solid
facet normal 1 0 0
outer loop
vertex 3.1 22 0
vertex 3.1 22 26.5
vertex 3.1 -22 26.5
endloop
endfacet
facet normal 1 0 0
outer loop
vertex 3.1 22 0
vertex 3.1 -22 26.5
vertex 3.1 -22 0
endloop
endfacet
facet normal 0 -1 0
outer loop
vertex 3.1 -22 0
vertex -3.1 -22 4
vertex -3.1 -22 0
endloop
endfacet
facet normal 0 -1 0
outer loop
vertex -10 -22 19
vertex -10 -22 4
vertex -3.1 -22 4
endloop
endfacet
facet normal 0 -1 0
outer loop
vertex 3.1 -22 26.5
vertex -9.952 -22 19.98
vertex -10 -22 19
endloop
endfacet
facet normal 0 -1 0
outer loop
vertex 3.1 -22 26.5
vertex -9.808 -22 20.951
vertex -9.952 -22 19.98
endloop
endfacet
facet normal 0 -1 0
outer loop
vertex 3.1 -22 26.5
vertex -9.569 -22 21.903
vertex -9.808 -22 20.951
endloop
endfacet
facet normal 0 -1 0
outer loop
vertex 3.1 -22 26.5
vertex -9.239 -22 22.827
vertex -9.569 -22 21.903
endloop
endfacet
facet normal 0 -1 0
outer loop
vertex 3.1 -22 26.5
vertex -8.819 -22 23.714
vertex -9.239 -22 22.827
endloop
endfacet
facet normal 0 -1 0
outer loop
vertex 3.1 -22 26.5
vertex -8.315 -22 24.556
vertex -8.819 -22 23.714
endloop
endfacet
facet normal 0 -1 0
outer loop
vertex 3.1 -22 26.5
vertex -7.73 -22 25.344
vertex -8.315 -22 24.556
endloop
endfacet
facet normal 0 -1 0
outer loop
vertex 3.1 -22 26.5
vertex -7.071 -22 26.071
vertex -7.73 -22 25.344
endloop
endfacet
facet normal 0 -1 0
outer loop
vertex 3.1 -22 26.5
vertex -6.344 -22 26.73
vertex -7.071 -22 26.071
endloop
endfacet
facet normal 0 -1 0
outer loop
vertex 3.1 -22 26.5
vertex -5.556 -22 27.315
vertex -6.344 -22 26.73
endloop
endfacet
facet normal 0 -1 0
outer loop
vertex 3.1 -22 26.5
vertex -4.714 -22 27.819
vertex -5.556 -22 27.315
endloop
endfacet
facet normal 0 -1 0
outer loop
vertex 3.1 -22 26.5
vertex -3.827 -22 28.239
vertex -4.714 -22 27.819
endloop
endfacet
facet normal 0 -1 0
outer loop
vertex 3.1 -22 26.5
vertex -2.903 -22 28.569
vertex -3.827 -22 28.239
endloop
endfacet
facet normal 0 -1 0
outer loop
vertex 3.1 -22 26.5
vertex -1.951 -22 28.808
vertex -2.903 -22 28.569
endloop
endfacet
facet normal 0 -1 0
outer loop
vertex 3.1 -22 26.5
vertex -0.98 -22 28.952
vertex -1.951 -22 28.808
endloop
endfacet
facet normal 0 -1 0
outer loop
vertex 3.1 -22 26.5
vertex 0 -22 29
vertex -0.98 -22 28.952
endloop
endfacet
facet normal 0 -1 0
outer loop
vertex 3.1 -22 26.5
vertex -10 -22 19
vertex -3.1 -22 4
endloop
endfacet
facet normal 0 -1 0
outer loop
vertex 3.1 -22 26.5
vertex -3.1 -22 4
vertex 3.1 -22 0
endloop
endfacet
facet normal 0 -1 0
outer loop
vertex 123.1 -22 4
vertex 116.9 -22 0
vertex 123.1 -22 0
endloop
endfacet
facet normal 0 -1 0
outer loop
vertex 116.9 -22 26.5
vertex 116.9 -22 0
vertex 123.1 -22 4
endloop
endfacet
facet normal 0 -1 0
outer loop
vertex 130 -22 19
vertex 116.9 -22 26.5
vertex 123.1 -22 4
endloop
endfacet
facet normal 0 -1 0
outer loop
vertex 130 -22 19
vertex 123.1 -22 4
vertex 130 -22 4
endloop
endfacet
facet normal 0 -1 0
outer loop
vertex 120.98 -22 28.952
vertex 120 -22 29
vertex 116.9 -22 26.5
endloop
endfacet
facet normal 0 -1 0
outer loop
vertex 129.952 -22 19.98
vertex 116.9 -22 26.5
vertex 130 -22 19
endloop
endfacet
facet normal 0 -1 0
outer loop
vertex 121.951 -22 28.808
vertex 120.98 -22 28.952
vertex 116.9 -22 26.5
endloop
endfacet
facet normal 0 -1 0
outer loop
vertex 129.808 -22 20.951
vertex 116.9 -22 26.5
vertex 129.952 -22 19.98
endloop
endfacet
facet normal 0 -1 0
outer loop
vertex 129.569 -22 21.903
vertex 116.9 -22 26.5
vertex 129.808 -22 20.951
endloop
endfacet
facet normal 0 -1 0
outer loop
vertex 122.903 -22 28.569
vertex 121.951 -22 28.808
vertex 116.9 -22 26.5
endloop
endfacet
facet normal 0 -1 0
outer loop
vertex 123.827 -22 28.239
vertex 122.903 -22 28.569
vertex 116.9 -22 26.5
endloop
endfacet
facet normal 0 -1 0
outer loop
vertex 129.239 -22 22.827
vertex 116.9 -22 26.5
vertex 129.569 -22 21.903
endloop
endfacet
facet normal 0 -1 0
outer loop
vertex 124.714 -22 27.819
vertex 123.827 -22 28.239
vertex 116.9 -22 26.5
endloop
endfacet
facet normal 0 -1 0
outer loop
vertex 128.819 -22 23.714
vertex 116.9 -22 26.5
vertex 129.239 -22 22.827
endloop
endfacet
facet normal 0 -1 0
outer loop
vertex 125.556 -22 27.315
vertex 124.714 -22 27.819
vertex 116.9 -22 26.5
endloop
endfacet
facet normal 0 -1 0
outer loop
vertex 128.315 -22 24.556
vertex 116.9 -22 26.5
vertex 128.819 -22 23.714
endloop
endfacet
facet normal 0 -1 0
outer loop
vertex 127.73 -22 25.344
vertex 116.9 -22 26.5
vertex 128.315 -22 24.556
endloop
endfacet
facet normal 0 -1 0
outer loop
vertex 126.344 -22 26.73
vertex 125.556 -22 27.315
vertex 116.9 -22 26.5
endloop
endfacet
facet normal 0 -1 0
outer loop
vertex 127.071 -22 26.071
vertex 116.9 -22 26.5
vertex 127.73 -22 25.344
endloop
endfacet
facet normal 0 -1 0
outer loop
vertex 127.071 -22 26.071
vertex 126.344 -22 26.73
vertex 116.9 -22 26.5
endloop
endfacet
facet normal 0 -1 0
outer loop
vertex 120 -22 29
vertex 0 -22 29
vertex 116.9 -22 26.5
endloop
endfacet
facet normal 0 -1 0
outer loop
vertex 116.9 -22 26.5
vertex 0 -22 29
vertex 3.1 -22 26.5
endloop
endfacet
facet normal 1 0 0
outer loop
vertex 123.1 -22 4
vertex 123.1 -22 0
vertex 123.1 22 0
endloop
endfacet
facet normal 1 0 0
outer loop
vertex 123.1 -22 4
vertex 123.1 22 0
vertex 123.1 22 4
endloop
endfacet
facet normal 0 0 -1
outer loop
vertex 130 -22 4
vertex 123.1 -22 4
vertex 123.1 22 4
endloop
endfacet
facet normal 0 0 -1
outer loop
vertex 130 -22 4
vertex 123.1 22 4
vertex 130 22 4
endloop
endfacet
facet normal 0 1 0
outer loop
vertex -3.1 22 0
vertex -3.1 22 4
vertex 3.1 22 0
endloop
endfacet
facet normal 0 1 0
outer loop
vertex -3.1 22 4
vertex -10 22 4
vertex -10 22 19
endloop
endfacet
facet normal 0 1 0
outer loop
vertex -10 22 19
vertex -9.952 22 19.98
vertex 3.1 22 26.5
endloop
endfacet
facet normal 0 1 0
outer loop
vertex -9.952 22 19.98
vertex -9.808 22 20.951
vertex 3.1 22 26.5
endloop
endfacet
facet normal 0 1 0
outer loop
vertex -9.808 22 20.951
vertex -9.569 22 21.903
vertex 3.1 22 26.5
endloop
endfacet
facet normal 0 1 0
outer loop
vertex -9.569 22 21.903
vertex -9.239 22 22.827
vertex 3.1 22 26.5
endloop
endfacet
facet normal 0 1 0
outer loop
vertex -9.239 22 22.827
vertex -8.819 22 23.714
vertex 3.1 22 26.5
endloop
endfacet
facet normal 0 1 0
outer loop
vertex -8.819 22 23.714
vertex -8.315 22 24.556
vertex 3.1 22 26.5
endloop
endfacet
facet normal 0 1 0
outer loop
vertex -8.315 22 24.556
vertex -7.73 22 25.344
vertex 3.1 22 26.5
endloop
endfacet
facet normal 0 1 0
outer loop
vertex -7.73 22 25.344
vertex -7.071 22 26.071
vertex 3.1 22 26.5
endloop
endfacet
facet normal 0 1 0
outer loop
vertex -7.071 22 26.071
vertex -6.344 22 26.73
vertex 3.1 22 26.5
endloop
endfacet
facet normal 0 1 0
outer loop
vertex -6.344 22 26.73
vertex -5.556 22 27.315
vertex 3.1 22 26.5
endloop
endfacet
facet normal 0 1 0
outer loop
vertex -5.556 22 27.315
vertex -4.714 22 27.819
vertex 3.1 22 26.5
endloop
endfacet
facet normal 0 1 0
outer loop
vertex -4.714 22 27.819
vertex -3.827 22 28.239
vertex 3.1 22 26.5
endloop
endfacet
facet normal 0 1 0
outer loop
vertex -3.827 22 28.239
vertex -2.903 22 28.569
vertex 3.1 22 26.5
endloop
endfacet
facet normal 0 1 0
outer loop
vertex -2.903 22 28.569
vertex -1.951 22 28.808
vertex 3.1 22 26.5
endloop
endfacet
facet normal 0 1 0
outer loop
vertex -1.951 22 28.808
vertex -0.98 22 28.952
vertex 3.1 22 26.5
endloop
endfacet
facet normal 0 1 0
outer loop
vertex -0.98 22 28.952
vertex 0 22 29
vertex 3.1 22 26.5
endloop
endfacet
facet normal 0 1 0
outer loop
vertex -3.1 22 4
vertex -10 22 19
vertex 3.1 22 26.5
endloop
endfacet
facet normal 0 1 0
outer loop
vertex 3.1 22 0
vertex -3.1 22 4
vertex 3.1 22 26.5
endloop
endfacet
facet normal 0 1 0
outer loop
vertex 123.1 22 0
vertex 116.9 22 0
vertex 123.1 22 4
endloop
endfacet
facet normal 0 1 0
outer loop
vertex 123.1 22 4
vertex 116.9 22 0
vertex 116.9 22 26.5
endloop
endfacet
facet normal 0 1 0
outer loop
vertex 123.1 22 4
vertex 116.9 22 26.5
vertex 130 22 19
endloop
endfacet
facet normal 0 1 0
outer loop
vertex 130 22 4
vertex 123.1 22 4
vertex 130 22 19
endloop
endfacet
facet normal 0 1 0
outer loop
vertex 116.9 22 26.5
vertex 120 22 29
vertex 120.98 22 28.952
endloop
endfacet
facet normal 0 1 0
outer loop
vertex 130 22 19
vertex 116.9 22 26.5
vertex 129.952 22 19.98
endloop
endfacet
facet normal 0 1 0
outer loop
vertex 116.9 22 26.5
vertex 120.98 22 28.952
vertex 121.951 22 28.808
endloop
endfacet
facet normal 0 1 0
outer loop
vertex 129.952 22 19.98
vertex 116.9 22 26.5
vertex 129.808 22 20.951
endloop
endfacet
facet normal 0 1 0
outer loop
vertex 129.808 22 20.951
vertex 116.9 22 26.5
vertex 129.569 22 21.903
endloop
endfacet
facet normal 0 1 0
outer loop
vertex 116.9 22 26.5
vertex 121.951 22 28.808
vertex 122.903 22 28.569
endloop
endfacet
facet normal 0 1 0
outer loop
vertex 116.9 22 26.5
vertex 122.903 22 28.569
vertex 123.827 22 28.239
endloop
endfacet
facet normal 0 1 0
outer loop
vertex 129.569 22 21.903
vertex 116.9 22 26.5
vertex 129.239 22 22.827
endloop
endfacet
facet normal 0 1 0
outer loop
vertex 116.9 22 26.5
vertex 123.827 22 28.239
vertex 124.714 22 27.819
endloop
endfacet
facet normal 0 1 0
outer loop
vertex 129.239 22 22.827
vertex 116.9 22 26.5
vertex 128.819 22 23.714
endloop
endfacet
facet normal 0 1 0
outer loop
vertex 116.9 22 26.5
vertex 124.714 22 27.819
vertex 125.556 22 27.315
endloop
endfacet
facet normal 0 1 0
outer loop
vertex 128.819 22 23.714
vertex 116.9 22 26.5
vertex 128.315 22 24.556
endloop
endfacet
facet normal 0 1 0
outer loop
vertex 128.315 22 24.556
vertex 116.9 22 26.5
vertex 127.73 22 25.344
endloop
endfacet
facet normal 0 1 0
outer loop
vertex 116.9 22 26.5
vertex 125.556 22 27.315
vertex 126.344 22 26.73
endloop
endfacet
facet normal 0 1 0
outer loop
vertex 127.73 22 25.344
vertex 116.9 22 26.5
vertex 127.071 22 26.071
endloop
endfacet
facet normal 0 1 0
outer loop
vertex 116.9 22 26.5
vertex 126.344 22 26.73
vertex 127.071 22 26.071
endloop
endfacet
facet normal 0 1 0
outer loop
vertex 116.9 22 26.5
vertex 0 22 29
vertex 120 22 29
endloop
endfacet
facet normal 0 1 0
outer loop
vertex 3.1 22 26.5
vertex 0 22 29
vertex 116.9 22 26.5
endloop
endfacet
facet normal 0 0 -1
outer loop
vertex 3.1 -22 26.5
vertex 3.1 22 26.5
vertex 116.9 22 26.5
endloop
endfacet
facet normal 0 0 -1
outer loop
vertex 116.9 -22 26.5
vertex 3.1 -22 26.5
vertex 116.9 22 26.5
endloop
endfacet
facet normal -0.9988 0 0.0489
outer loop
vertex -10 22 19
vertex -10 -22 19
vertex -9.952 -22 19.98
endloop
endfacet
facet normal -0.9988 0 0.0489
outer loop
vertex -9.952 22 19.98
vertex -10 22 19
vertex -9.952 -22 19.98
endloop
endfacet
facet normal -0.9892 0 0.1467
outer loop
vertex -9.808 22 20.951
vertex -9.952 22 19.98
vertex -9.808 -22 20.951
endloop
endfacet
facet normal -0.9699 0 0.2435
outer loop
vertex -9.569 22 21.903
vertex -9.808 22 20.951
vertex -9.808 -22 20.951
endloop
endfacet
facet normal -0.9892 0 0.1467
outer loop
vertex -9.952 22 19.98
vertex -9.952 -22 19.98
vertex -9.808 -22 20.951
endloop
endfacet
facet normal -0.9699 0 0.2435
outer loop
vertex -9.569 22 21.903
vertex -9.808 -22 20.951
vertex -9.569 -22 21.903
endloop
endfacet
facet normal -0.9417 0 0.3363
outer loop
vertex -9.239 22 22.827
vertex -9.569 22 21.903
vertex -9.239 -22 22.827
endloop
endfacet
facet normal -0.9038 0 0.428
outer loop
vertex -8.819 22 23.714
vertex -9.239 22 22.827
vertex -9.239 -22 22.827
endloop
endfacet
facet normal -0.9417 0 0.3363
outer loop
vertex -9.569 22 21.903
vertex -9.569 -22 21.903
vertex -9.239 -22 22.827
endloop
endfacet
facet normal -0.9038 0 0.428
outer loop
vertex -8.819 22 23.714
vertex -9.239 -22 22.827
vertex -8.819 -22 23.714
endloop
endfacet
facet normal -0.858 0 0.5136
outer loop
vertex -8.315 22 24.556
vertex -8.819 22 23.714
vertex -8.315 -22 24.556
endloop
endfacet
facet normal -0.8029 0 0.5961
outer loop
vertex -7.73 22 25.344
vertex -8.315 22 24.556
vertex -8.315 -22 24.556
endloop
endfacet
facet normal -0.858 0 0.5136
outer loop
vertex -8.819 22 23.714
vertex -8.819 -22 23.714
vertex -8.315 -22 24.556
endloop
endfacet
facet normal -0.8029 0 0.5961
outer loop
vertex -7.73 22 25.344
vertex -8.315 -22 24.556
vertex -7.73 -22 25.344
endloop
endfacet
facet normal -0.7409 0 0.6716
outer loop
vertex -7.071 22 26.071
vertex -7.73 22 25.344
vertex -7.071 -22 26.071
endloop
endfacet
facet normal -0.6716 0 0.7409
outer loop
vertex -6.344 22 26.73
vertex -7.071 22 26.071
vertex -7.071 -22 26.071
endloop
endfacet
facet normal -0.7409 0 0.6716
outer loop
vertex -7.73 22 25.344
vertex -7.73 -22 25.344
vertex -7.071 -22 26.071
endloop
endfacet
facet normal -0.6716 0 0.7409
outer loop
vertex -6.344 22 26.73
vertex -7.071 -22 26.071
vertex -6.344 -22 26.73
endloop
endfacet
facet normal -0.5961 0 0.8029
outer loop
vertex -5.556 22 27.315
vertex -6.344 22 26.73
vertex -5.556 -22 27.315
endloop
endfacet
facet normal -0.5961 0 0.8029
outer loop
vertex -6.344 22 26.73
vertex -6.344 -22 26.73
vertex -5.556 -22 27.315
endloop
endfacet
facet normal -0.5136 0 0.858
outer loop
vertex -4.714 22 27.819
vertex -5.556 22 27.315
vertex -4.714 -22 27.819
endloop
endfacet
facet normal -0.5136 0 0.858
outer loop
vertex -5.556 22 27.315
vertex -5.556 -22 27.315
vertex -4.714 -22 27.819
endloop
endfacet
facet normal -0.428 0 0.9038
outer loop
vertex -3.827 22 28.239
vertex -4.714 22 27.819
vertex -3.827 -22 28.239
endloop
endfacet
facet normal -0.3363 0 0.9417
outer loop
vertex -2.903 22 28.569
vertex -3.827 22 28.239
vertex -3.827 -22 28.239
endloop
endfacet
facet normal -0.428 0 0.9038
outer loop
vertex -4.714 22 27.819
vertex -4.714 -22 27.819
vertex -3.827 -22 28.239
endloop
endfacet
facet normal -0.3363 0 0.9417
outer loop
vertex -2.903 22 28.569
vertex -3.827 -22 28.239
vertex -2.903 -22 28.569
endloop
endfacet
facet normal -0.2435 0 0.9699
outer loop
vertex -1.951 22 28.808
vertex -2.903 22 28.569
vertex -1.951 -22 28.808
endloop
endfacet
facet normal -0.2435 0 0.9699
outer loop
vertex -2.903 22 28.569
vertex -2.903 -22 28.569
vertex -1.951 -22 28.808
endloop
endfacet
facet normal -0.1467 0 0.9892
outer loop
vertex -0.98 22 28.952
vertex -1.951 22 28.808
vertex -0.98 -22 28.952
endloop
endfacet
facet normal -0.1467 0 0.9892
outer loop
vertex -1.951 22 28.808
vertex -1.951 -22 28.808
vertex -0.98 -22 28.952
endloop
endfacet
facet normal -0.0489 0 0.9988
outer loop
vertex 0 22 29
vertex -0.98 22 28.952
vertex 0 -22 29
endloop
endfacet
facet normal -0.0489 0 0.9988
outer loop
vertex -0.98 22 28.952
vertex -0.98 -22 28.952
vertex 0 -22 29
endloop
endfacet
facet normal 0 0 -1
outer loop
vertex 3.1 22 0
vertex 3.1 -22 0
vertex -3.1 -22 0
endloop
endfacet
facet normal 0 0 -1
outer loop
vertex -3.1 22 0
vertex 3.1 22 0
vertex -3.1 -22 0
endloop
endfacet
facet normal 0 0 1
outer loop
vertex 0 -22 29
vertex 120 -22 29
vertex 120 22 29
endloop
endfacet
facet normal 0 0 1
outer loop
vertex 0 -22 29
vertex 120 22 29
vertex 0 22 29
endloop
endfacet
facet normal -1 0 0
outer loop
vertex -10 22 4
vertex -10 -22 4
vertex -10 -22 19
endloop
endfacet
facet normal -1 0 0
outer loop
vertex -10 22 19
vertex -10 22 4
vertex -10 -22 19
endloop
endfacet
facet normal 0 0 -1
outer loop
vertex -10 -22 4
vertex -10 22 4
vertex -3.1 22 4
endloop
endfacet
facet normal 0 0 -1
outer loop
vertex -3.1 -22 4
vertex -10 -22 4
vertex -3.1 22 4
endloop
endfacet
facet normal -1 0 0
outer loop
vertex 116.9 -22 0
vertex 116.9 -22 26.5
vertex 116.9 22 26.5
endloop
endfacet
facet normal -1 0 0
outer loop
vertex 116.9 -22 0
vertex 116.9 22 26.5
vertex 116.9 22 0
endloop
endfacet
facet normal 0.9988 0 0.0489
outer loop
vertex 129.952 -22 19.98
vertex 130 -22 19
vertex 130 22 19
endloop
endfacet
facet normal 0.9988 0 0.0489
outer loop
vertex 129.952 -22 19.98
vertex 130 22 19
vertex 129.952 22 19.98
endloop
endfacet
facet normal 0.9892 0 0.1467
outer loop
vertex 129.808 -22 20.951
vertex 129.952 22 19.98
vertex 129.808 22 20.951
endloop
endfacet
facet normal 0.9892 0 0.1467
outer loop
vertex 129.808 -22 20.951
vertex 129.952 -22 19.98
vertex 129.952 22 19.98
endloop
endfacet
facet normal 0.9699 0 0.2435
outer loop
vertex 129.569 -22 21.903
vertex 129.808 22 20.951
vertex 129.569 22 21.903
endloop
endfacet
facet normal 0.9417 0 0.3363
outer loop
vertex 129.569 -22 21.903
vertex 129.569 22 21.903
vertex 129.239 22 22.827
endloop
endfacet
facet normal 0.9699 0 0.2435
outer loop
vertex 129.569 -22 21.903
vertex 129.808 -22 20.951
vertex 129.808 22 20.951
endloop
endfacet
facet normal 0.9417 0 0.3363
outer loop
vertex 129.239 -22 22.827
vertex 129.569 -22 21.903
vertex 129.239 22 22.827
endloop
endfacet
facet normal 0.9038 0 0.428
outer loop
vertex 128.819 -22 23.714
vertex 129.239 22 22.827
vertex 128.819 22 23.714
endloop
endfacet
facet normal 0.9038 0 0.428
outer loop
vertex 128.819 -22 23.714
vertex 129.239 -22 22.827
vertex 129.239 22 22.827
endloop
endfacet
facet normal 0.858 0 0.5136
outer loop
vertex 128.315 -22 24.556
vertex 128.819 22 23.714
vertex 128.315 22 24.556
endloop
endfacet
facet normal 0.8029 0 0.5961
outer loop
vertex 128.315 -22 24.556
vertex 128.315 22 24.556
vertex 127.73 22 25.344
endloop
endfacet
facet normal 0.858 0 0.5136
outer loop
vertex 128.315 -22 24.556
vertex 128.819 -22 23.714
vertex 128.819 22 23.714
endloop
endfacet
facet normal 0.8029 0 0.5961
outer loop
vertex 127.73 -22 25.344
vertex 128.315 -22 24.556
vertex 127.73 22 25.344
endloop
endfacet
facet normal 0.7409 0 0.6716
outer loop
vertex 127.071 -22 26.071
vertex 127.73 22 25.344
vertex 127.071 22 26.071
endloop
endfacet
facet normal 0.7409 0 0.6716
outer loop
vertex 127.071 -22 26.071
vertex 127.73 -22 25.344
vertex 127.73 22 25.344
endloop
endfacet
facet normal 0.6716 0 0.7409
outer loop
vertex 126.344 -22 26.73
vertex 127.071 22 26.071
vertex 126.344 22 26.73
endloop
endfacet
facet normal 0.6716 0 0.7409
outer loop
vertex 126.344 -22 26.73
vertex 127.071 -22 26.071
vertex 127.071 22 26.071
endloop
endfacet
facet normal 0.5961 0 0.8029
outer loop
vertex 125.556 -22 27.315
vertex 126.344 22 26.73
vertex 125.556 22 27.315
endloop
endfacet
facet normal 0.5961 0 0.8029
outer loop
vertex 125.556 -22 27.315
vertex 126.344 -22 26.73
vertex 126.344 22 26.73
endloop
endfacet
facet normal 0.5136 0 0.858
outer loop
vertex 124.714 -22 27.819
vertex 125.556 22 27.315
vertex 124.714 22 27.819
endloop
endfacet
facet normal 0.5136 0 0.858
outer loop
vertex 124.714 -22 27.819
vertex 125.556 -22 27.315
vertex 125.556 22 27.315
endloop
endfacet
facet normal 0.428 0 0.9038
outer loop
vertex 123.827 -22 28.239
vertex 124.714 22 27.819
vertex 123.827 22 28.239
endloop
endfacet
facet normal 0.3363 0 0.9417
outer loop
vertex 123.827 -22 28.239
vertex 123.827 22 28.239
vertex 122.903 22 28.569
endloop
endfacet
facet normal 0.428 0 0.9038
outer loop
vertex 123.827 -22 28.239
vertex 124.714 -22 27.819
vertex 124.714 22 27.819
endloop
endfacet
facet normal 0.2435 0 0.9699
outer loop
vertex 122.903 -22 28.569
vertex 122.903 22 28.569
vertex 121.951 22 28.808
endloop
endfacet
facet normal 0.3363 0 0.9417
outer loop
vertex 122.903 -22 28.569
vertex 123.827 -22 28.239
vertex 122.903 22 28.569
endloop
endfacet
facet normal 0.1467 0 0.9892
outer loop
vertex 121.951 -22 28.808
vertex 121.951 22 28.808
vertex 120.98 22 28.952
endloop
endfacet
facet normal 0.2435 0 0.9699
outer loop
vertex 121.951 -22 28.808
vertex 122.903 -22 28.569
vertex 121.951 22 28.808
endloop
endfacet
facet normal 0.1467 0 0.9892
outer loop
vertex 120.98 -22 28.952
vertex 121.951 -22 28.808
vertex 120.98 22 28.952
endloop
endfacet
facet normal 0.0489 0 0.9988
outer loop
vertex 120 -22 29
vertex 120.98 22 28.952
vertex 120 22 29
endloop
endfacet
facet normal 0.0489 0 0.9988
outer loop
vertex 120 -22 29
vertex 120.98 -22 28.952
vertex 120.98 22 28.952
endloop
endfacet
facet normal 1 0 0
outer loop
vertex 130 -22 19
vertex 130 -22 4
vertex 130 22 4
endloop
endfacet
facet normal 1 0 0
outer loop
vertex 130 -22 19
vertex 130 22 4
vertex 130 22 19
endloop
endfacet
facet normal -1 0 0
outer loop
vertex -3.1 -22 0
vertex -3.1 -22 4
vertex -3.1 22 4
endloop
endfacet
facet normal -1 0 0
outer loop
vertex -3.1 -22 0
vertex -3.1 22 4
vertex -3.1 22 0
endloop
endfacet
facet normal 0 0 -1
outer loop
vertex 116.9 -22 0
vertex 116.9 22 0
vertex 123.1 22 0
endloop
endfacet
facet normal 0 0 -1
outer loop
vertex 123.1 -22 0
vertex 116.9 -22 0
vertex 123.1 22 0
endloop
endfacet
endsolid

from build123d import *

# Parameters (mm, degrees)
EXTRUDE_1_DEPTH     = 14
CUT_EXTRUDE_1_DEPTH = 44
SKETCH_3_W          = 6.2
SKETCH_3_H          = 6.2
CUT_EXTRUDE_2_DEPTH = 4
SKETCH_4_R          = 4
CUT_EXTRUDE_3_DEPTH = 5
SKETCH_5_R          = 2.6
CUT_EXTRUDE_4_DEPTH = 5
SKETCH_6_R          = 4
EXTRUDE_2_DEPTH     = 10
SKETCH_7_W          = 6.2
SKETCH_7_H          = 4
EXTRUDE_3_DEPTH     = 40
CUT_EXTRUDE_5_DEPTH = 50
SKETCH_9_W          = 20
SKETCH_9_H          = 25
EXTRUDE_4_DEPTH     = 44
CUT_EXTRUDE_6_DEPTH = 44
EXTRUDE_5_DEPTH     = 44
SKETCH_12_W         = 6.9
SKETCH_12_H         = 22.5
CUT_EXTRUDE_7_DEPTH = 50


with BuildPart() as part:
    # 草图1 → 凸台-拉伸1 (new body)
    with BuildSketch(Plane.XY):
        Polygon((-15, 22), (-15, -22), (15, -22), (15, 22), (0, 22), align=None)
    extrude(amount=EXTRUDE_1_DEPTH)

    # 草图2 → 切除-拉伸1 (cut)
    with BuildSketch(Plane(origin=(0, 22, 0), x_dir=(1, 0, 0), z_dir=(0, 1, 0))):
        Polygon((-15, 0), (-15, -14), (-10, -4), (-3.1, -4), (-3.1, 0), align=None)
        Polygon((3.1, -4), (10, -4), (15, -14), (15, 0), (3.1, 0), align=None)
    extrude(amount=-CUT_EXTRUDE_1_DEPTH, mode=Mode.SUBTRACT)

    # 草图3 → 切除-拉伸2 (cut)
    with BuildSketch(Plane(origin=(0, 0, 0), x_dir=(-1, 0, 0), z_dir=(0, 0, -1))):
        Rectangle(SKETCH_3_W, SKETCH_3_H)
    extrude(amount=-CUT_EXTRUDE_2_DEPTH, mode=Mode.SUBTRACT)

    # 草图4 → 切除-拉伸3 (cut)
    with BuildSketch(Plane.XY.offset(14)):
        Circle(SKETCH_4_R)
    extrude(amount=-CUT_EXTRUDE_3_DEPTH, mode=Mode.SUBTRACT)

    # 草图5 → 切除-拉伸4 (cut)
    with BuildSketch(Plane.XY.offset(9)):
        Circle(SKETCH_5_R)
    extrude(amount=-CUT_EXTRUDE_4_DEPTH, mode=Mode.SUBTRACT)

    # 草图6 → 凸台-拉伸2 (add)
    with BuildSketch(Plane.XY.offset(14)):
        Circle(SKETCH_6_R)
    extrude(amount=-EXTRUDE_2_DEPTH)

    # 草图7 → 凸台-拉伸3 (add)
    with BuildSketch(Plane(origin=(0, -22, 0), x_dir=(-1, 0, 0), z_dir=(0, -1, 0))):
        with Locations((0, -2)):
            Rectangle(SKETCH_7_W, SKETCH_7_H)
    extrude(amount=-EXTRUDE_3_DEPTH)

    # 草图8 → 切除-拉伸5 (cut)
    with BuildSketch(Plane.XZ.offset(22)):
        Polygon((-15, 14), (-10, 4), (-10, 14), align=None)
        Polygon((15, 14), (10, 14), (10, 4), align=None)
    extrude(amount=-CUT_EXTRUDE_5_DEPTH, mode=Mode.SUBTRACT)

    # 草图9 → 凸台-拉伸4 (add)
    with BuildSketch(Plane.XZ.offset(22)):
        with Locations((0, 16.5)):
            Rectangle(SKETCH_9_W, SKETCH_9_H)
    extrude(amount=-EXTRUDE_4_DEPTH)

    # 草图10 → 切除-拉伸6 (cut)
    with BuildSketch(Plane.XZ.offset(22)):
        with BuildLine():
            Line((-10, 29), (-10, 19))
            ThreePointArc((-10, 19), (-7.071067812, 26.071067812), (0, 29))
            Line((0, 29), (-10, 29))
        make_face()
    extrude(amount=-CUT_EXTRUDE_6_DEPTH, mode=Mode.SUBTRACT)

    # 草图11 → 凸台-拉伸5 (add)
    with BuildSketch(Plane.XZ.offset(22)):
        with BuildLine():
            Line((120, 0), (123.1, 0))
            Line((123.1, 0), (123.1, 4))
            Line((123.1, 4), (130, 4))
            Line((130, 4), (130, 19))
            ThreePointArc((130, 19), (127.071067812, 26.071067812), (120, 29))
            Line((120, 29), (110, 29))
            Line((110, 29), (10, 29))
            Line((10, 29), (10, 26.5))
            Line((10, 26.5), (110, 26.5))
            Line((110, 26.5), (110, 4))
            Line((110, 4), (116.9, 4))
            Line((116.9, 4), (116.9, 0))
            Line((116.9, 0), (120, 0))
        make_face()
    extrude(amount=-EXTRUDE_5_DEPTH)

    # 草图12 → 切除-拉伸7 (cut)
    with BuildSketch(Plane(origin=(0, 22, 0), x_dir=(1, 0, 0), z_dir=(0, 1, 0))):
        with Locations((6.55, -15.25)):
            Rectangle(SKETCH_12_W, SKETCH_12_H)
        with Locations((113.45, -15.25)):
            Rectangle(SKETCH_12_W, SKETCH_12_H)
    extrude(amount=-CUT_EXTRUDE_7_DEPTH, mode=Mode.SUBTRACT)


solid = part.part
